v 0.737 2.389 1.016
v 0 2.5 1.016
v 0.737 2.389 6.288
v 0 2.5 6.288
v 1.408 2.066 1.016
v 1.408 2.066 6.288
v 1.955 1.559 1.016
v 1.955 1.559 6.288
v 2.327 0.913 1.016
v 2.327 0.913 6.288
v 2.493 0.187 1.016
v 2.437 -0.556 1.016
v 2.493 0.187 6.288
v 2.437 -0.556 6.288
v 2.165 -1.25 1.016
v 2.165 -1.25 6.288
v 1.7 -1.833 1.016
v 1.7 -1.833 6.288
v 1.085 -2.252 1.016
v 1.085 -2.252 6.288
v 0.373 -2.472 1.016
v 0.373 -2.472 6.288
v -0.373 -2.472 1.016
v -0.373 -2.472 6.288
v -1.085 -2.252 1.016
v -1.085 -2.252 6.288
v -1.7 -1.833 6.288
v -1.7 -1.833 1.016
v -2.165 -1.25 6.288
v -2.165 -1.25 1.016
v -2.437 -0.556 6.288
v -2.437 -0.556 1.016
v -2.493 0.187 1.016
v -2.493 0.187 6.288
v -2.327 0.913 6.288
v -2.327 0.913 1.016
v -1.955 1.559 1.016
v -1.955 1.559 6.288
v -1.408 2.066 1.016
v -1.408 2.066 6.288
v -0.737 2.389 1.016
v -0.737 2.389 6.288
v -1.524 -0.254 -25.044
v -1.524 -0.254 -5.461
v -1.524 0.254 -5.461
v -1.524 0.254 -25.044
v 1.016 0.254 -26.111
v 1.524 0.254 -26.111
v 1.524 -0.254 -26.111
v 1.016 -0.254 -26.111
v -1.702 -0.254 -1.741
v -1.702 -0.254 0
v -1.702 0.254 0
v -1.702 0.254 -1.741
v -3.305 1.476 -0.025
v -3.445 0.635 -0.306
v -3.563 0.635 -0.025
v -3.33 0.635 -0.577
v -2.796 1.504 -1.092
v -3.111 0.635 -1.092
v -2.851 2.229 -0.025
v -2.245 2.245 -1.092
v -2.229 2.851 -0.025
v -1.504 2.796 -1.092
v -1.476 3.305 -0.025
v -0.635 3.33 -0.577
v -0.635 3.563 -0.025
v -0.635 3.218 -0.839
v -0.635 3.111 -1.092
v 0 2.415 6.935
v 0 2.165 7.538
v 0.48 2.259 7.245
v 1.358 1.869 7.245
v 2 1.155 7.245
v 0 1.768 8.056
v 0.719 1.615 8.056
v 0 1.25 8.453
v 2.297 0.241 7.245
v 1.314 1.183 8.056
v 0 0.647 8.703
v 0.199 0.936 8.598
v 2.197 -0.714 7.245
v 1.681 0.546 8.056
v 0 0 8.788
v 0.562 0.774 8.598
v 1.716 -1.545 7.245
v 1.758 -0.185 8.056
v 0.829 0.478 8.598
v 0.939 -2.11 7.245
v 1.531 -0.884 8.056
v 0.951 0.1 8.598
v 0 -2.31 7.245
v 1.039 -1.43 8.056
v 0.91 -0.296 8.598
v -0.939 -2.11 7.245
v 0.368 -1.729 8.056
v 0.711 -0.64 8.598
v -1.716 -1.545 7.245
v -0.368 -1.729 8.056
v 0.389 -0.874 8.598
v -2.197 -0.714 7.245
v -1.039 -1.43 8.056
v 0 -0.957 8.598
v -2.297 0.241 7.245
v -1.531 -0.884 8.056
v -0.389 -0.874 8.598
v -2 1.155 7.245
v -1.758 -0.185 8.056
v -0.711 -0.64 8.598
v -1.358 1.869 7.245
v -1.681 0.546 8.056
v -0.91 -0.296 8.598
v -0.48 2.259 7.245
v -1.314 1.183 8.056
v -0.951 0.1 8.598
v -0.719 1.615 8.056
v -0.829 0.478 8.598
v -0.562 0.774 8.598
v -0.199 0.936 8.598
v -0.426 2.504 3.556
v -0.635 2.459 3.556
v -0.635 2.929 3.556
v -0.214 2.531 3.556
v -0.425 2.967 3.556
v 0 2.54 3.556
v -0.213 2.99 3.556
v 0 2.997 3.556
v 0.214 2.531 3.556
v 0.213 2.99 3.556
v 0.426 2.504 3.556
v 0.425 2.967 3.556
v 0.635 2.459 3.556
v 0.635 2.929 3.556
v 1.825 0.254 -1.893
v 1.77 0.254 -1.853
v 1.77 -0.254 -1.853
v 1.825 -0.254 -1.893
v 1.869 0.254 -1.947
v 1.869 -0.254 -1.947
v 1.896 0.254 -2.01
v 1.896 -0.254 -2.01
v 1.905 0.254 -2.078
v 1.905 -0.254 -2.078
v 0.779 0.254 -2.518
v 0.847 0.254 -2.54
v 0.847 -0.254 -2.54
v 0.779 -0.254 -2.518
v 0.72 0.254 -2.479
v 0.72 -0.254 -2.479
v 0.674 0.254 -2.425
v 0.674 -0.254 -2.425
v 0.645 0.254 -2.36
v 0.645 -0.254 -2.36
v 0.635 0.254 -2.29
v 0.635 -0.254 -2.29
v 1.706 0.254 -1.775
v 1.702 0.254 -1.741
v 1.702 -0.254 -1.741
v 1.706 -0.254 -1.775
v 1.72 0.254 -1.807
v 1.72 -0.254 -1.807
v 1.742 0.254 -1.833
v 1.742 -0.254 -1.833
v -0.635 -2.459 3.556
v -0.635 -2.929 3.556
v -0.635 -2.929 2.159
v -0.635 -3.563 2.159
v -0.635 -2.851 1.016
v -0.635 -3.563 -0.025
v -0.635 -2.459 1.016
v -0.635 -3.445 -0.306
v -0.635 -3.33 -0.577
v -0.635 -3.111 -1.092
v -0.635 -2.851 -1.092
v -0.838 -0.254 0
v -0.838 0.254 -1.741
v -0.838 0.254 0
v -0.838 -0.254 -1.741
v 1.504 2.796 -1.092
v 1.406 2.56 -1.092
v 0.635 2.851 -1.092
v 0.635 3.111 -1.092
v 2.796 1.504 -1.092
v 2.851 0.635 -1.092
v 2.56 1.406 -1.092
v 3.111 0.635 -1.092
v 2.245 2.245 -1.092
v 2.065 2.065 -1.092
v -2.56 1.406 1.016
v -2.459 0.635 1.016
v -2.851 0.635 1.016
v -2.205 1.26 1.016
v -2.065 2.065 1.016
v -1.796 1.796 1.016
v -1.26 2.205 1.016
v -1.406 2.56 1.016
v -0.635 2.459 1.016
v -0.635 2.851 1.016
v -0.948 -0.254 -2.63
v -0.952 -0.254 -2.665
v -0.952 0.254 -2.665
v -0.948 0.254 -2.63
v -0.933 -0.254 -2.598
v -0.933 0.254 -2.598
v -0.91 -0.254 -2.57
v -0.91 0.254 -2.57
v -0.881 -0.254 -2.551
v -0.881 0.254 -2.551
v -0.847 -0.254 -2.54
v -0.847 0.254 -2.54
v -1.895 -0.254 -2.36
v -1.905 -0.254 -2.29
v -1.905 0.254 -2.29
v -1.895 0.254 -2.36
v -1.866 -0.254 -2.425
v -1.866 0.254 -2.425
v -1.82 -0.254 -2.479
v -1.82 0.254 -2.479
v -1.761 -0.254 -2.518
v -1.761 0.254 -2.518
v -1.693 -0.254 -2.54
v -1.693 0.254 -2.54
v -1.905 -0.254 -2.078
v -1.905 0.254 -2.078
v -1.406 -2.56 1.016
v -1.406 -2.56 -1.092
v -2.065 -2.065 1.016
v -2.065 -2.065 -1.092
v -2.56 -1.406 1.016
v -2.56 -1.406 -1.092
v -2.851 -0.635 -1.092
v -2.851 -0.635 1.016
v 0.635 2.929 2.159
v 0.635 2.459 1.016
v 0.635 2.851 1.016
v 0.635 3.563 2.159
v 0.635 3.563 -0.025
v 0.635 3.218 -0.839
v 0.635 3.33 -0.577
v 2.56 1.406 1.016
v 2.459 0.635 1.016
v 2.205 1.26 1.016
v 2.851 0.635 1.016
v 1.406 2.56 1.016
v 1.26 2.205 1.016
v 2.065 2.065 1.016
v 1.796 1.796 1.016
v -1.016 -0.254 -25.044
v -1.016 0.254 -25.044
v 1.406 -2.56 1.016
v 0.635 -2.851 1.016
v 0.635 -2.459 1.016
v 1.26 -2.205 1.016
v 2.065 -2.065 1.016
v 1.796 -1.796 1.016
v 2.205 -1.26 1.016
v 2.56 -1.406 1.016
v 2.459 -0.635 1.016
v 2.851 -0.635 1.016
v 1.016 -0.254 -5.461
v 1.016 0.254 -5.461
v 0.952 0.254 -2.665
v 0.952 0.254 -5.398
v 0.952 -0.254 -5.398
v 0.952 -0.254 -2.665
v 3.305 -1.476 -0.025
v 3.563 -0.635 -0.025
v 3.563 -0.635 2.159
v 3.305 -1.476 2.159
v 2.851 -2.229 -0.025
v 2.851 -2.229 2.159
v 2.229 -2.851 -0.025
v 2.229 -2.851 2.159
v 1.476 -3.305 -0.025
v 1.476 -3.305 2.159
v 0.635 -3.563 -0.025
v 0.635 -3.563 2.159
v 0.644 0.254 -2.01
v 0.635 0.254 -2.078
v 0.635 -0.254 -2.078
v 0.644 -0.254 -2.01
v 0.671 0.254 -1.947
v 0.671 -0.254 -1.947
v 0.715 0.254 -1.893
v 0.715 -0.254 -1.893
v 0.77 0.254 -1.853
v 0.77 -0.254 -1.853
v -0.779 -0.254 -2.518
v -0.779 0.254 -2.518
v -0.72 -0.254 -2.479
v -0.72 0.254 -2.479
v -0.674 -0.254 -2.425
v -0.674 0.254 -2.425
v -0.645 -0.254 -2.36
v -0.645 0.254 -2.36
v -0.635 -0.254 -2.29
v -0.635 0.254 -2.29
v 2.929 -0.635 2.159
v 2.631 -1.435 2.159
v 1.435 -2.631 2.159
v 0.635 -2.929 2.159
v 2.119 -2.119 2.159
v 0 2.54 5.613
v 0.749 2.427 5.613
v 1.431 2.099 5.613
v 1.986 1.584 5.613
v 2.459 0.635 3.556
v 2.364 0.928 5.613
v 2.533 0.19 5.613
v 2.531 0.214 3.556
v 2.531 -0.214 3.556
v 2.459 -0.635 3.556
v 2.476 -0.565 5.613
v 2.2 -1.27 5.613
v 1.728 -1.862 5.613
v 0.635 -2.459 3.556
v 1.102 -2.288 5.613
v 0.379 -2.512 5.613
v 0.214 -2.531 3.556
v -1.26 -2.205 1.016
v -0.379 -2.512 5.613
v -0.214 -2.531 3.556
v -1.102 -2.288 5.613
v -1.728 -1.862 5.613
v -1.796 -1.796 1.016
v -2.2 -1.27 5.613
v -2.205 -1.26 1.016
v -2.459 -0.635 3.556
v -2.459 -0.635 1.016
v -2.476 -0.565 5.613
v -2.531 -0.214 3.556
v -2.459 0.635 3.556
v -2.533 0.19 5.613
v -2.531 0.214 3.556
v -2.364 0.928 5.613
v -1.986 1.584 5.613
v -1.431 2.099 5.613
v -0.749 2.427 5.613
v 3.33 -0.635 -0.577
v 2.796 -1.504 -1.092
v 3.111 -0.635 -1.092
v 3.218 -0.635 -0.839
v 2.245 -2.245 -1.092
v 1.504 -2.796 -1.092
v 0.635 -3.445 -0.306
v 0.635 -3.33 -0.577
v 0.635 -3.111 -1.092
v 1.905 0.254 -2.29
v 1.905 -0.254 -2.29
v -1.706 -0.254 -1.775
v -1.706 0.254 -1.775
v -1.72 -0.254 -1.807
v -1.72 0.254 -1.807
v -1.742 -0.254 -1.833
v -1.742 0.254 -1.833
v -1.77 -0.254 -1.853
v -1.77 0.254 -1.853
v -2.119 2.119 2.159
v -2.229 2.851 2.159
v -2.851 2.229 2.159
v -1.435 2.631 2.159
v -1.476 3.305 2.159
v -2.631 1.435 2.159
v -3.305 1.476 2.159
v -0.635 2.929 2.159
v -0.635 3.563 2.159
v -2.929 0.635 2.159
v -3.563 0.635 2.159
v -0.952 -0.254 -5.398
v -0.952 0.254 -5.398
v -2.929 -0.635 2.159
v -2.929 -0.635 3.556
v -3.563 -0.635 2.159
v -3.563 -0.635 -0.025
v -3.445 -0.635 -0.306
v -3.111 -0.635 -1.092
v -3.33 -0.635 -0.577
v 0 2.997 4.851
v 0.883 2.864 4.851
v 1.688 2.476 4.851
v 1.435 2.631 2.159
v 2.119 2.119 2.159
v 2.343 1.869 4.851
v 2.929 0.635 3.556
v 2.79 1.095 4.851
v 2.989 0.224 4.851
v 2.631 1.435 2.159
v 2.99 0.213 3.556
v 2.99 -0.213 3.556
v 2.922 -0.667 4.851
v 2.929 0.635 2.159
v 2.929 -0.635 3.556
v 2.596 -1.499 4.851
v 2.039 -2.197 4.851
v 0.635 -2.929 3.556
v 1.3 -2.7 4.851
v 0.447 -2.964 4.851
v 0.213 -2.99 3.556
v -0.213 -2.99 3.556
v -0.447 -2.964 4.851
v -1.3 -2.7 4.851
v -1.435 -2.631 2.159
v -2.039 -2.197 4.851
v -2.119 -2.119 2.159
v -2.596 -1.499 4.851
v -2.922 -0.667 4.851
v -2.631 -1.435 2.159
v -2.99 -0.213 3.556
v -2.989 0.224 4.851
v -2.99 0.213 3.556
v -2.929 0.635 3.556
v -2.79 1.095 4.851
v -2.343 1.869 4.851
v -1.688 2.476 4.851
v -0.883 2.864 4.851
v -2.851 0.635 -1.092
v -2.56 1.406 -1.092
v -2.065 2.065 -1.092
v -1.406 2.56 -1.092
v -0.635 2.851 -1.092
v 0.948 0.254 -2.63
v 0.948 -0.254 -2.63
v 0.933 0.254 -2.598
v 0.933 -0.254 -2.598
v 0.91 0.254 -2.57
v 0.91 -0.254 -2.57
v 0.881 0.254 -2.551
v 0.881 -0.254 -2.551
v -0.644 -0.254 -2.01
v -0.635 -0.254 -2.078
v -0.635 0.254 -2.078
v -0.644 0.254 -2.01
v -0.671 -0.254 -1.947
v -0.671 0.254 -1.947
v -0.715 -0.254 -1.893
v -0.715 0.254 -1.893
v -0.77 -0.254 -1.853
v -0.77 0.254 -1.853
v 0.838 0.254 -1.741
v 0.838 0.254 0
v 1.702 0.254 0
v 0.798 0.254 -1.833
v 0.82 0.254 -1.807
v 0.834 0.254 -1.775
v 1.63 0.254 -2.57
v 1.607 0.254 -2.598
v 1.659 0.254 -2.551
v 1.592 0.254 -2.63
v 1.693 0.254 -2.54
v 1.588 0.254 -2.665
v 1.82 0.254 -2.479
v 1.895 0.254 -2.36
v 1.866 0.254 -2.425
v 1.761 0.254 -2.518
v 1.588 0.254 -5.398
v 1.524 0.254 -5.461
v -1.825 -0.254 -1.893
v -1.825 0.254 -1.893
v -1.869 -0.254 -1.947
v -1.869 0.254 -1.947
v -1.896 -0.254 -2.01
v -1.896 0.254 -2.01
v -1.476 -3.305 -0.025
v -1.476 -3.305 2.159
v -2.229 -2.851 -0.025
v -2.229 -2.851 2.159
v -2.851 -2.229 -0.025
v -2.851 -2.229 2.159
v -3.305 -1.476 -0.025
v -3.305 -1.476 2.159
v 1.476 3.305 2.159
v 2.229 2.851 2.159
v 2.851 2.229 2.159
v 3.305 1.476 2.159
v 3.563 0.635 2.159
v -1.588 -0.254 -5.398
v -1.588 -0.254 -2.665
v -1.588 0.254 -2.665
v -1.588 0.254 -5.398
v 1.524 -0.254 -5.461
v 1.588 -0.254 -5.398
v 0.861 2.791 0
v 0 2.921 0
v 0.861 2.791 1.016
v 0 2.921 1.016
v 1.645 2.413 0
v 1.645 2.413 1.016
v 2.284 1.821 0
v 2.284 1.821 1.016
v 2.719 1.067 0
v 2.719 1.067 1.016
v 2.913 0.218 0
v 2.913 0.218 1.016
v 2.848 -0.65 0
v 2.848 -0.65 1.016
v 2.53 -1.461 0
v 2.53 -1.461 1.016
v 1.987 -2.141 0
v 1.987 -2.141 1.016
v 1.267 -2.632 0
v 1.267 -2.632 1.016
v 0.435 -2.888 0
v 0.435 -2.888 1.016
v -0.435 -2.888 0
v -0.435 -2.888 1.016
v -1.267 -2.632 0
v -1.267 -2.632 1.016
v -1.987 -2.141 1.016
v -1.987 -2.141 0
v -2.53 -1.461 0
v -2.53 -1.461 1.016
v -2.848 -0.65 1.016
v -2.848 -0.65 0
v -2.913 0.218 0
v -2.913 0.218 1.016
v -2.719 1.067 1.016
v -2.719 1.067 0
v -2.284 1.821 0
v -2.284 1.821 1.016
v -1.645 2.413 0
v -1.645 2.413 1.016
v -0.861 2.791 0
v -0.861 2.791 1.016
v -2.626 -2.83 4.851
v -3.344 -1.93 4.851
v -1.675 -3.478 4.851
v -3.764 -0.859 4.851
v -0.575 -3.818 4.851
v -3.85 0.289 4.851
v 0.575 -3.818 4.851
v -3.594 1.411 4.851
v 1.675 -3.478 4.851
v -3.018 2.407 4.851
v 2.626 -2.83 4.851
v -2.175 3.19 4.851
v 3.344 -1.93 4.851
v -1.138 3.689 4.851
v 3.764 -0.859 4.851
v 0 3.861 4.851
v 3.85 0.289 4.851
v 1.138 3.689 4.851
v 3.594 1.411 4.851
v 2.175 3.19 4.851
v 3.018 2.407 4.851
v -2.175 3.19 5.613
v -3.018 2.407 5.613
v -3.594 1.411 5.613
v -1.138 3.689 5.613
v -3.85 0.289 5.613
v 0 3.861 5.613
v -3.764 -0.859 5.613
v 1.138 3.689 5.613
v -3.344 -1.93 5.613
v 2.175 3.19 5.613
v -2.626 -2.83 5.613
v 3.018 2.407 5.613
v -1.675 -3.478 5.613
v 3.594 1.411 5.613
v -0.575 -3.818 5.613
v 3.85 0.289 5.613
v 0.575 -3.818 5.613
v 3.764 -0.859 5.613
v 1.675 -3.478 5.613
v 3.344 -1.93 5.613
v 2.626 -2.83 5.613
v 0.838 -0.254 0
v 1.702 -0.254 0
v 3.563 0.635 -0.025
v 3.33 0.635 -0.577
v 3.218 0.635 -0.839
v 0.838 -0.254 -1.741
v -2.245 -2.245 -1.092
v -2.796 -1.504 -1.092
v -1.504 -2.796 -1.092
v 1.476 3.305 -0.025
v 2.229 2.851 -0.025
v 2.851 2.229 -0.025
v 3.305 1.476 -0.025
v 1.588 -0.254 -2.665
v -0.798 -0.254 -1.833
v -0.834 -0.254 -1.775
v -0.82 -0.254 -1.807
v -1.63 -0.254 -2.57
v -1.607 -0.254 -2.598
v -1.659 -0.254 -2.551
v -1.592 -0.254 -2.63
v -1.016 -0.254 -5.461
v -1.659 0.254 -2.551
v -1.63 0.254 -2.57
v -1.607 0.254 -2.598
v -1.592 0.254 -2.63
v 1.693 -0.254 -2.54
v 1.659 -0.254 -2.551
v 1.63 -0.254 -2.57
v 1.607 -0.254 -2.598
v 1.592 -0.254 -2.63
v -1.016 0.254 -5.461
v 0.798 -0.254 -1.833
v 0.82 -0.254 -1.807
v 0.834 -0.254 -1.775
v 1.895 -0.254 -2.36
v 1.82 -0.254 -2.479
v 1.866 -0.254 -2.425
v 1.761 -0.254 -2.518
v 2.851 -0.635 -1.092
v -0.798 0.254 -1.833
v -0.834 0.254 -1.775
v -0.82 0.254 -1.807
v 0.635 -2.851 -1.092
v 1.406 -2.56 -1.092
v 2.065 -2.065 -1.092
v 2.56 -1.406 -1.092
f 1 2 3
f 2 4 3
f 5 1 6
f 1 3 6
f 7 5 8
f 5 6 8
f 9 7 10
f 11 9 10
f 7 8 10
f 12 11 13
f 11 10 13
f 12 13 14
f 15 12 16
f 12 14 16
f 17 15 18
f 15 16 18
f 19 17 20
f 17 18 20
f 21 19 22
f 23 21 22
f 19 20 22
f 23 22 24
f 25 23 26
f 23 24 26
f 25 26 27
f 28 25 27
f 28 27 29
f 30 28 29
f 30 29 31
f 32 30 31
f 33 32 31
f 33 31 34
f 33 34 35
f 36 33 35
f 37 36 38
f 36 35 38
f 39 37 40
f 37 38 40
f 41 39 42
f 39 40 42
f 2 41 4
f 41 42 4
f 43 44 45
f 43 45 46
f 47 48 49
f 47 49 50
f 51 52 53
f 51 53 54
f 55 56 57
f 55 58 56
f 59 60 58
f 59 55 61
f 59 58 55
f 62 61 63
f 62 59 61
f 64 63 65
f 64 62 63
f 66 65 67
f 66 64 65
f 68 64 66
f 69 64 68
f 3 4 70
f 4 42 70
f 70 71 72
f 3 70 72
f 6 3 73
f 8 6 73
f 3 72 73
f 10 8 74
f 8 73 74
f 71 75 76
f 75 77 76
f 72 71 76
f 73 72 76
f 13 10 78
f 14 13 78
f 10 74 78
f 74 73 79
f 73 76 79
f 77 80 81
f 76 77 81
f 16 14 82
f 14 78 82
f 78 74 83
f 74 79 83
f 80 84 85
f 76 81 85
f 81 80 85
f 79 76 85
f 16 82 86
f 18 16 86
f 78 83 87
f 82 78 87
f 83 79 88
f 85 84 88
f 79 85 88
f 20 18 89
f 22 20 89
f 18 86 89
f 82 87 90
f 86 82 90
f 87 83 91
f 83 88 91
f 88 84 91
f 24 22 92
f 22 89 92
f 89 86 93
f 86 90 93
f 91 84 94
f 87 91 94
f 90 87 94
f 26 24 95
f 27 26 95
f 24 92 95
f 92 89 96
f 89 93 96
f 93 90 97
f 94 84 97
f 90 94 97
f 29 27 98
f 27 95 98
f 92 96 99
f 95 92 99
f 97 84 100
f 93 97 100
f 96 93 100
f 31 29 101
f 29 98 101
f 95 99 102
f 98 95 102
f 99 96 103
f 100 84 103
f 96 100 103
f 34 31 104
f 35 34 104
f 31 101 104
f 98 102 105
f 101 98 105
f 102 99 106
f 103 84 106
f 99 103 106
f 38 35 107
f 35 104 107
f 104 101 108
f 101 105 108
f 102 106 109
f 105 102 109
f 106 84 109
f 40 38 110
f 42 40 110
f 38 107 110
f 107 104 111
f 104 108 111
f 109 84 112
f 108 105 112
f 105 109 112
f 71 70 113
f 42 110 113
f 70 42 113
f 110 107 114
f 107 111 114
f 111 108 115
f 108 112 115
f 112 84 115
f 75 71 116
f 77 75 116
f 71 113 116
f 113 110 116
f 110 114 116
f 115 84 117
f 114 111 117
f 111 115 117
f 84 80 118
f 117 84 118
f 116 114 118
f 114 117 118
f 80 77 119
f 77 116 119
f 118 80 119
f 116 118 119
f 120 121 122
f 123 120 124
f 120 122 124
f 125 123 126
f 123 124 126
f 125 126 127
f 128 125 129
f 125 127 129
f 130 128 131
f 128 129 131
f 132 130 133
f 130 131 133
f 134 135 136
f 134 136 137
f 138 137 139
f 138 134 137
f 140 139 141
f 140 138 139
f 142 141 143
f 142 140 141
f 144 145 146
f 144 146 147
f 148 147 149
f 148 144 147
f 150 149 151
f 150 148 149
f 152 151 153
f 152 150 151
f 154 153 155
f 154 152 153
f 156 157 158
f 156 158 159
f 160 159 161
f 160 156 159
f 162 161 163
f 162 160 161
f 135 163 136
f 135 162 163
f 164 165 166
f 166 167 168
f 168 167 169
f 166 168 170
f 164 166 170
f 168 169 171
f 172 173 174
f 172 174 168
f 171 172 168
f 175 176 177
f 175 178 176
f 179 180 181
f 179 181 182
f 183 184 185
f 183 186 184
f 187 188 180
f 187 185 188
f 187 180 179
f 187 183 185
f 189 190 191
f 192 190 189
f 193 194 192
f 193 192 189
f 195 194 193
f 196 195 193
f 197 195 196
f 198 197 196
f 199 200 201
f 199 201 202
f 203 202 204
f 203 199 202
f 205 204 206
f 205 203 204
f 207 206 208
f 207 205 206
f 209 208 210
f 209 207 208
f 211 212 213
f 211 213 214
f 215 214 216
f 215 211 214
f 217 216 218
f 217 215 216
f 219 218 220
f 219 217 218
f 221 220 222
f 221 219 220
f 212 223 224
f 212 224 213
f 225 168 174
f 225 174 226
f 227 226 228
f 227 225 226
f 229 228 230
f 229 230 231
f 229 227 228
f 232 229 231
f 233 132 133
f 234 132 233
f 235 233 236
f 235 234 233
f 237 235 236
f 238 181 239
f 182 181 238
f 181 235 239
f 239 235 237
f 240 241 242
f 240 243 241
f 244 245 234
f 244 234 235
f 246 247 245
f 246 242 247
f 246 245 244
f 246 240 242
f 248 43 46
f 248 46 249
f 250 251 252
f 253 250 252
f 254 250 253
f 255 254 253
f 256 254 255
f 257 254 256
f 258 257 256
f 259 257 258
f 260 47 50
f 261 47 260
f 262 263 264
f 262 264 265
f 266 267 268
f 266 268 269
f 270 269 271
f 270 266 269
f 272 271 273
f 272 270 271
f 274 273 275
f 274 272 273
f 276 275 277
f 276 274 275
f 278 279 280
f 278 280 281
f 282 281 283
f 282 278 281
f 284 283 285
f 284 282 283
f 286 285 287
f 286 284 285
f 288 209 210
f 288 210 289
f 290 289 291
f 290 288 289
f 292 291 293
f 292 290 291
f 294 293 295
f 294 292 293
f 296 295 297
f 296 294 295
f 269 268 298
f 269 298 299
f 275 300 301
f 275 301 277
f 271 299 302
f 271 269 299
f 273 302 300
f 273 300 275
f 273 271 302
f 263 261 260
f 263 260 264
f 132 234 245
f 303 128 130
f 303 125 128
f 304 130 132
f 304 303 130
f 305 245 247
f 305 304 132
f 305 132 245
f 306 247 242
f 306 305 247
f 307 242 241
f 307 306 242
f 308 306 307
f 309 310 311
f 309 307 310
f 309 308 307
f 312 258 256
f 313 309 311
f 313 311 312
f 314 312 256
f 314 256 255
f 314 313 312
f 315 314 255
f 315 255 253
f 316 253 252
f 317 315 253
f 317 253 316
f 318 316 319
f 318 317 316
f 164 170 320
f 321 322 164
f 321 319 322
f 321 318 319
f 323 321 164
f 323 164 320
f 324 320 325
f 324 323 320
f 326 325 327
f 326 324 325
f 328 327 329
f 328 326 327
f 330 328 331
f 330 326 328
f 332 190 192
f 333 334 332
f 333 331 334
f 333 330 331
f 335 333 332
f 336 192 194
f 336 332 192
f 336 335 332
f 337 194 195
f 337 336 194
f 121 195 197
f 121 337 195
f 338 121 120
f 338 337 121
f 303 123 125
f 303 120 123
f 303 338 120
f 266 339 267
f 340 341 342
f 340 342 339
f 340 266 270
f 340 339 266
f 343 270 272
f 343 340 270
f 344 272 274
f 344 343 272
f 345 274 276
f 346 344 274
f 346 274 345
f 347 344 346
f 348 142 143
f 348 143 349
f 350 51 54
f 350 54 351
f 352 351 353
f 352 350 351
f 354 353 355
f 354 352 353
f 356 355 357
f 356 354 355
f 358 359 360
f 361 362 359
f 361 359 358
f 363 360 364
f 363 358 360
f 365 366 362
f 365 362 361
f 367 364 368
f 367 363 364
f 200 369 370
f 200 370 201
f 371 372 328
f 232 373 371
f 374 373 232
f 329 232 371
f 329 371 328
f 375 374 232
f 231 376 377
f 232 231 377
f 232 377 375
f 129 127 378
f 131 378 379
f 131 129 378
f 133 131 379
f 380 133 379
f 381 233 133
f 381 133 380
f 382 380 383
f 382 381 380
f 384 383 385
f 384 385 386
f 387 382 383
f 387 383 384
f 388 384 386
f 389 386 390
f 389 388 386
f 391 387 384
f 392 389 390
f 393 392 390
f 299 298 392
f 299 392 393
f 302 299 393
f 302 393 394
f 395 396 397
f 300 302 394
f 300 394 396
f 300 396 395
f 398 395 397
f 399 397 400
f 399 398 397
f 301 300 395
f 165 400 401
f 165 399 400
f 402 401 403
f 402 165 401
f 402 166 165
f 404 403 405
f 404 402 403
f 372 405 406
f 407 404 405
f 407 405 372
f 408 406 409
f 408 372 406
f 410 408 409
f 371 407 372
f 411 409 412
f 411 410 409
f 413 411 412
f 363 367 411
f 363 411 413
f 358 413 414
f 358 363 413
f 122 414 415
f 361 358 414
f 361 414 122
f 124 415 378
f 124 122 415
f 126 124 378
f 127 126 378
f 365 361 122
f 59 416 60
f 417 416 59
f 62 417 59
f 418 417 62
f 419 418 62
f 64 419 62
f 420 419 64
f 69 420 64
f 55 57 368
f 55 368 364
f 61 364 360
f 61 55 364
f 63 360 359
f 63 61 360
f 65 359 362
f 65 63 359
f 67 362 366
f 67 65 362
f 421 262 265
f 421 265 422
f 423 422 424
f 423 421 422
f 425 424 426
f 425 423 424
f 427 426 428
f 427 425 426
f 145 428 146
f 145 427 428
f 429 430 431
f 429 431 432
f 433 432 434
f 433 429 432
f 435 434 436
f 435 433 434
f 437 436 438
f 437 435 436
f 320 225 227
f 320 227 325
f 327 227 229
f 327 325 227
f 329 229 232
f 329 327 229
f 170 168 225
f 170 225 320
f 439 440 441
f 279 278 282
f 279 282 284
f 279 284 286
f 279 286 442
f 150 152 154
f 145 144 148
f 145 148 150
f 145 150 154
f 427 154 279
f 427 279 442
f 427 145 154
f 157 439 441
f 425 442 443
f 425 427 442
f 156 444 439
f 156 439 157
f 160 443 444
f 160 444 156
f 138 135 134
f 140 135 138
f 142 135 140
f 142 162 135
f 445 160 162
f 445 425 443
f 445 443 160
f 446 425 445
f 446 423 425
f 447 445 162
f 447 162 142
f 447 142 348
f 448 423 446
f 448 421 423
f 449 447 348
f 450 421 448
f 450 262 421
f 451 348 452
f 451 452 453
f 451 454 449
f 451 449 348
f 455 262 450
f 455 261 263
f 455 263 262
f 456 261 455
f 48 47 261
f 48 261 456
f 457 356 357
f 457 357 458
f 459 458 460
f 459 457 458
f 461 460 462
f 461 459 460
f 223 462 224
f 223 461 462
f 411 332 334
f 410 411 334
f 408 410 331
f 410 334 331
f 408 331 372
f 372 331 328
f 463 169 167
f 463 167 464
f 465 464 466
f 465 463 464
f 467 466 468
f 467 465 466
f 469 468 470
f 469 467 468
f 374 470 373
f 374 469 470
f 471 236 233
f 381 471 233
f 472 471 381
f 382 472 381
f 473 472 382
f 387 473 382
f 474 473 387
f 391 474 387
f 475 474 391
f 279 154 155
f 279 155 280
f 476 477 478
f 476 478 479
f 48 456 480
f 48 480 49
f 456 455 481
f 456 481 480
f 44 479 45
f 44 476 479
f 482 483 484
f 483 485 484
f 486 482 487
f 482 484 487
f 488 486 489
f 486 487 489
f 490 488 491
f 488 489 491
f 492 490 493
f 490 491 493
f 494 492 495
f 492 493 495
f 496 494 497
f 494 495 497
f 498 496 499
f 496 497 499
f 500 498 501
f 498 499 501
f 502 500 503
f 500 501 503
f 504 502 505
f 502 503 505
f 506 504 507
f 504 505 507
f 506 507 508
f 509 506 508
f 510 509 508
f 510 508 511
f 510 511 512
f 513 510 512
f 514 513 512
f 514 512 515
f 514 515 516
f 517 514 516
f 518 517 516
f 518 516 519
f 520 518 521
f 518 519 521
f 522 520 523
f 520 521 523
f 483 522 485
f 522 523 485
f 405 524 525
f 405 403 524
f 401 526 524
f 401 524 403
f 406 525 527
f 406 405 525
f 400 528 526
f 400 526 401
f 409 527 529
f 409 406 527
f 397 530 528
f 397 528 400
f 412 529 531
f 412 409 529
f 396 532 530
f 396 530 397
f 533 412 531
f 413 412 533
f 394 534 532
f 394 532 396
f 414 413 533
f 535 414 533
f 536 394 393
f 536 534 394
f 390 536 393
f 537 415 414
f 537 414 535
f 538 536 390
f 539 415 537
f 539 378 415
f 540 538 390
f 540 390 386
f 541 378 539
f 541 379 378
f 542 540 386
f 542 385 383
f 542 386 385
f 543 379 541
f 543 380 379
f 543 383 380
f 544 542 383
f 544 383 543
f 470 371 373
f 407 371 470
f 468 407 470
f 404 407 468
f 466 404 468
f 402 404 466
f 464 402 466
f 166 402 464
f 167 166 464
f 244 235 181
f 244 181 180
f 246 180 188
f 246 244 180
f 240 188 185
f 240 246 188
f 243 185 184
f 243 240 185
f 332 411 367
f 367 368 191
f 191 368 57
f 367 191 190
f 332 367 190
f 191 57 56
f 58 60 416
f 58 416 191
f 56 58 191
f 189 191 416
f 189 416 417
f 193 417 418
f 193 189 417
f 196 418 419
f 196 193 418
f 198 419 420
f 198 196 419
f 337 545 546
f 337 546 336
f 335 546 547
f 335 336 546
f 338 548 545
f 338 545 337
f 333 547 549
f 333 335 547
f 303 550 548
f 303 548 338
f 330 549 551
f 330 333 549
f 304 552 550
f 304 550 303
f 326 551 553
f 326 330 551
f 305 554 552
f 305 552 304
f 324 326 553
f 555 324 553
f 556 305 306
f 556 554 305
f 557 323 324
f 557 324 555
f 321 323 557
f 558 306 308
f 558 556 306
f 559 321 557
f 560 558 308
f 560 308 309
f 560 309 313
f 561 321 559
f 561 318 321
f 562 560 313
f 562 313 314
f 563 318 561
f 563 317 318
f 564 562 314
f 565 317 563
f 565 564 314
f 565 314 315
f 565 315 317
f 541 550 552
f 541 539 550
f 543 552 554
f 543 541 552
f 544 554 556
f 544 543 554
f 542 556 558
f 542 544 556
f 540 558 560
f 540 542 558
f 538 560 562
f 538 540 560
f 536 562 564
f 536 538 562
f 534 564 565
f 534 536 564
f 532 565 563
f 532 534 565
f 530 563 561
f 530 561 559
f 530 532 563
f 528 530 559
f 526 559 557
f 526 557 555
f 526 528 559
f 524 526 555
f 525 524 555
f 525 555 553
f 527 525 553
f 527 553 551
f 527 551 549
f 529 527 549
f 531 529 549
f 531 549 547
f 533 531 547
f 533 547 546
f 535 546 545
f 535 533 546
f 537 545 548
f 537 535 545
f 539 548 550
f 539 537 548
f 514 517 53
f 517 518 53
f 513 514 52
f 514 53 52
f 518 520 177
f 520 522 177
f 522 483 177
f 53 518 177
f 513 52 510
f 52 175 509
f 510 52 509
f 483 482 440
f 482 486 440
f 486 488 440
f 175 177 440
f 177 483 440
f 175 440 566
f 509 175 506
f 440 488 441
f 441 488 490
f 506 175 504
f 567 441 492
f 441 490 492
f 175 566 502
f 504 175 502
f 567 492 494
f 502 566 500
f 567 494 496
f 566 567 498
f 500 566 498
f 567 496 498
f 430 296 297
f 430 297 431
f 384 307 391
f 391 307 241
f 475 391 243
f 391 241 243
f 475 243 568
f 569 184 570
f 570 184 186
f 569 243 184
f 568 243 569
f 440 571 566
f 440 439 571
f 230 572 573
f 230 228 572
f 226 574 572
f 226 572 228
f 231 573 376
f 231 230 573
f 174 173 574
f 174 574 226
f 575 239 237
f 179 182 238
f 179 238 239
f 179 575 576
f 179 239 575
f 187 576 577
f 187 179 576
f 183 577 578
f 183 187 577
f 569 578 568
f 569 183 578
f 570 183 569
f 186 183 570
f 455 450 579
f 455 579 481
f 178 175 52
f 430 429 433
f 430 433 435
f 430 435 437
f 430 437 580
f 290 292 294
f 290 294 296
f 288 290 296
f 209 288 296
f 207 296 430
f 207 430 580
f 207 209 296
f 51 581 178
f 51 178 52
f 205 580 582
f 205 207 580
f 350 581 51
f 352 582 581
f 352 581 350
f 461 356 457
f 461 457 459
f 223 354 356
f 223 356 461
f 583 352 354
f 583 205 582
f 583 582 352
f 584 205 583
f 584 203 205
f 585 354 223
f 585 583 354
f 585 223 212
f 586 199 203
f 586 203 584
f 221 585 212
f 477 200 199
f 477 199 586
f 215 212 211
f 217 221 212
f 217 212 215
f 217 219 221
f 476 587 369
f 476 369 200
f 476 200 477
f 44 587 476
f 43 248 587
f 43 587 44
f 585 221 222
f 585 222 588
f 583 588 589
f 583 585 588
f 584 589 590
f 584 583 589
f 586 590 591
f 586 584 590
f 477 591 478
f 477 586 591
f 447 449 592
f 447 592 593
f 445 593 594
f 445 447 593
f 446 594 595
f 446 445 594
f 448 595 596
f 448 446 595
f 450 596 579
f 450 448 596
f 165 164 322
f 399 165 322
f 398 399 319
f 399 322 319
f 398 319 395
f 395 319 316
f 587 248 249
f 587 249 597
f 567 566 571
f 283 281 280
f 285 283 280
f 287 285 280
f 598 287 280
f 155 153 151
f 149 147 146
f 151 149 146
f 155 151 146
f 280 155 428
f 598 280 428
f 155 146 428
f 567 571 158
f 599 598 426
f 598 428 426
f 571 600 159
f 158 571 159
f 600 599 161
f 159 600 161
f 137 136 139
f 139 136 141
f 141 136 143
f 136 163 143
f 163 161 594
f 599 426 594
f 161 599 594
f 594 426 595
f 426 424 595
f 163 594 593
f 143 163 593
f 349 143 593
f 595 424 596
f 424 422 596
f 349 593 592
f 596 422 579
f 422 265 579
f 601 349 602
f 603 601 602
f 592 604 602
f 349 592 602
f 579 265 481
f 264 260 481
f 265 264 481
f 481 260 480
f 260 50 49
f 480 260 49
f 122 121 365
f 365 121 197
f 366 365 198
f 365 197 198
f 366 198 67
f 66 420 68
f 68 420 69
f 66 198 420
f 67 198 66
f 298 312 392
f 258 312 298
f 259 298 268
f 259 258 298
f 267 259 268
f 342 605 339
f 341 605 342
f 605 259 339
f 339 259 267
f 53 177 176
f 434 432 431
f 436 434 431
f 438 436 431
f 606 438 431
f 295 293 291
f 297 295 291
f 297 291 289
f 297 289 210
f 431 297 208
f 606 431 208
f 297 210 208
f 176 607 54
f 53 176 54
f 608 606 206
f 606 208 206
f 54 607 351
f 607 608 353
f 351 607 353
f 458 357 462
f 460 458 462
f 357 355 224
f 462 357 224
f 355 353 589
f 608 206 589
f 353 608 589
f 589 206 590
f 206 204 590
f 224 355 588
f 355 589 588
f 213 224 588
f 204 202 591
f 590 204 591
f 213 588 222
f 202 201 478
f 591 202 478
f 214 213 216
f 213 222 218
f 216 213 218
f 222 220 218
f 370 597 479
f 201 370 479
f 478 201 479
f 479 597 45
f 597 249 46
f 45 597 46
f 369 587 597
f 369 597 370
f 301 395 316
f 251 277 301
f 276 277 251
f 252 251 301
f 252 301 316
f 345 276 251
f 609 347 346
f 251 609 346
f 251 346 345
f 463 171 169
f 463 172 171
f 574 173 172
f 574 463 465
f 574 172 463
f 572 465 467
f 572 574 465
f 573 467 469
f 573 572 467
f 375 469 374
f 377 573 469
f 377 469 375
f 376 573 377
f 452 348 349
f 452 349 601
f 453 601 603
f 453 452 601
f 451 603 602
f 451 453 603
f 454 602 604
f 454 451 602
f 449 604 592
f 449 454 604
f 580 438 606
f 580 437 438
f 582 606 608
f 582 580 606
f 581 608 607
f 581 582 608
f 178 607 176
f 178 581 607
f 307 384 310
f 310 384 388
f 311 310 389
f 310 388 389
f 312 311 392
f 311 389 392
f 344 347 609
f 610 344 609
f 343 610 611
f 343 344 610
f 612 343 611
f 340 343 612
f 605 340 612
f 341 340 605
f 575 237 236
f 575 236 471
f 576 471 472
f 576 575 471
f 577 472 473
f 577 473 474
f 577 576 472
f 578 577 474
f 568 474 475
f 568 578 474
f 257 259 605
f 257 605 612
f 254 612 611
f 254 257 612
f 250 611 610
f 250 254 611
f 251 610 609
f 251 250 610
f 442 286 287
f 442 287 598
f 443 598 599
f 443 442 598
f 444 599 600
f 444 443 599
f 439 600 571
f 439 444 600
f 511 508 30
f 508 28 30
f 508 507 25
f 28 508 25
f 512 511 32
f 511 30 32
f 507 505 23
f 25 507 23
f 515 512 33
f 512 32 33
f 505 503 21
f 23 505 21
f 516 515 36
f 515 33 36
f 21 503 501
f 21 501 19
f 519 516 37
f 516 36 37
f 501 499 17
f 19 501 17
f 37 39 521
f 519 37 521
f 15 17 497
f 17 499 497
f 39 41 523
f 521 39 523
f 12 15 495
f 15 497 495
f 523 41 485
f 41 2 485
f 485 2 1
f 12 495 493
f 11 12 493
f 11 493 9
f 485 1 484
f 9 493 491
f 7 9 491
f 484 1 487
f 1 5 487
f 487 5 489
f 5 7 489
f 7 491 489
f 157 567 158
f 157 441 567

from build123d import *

# Parameters (mm, degrees)
EXTRUDE1_DEPTH          = 0.254
EXTRUDE1_DEPTH_BACK     = 0.254
CUT_EXTRUDE_THIN2_START = -27.675950193
SKETCH5_W               = 1.27
SKETCH5_H               = 8.860157491
CUT_EXTRUDE_THIN2_DEPTH = 31.231950193
CIRPATTERN2_COUNT       = 2
CIRPATTERN2_ANGLE       = 90


with BuildPart() as part:
    # Sketch1 → Revolve1 (revolve)
    with BuildSketch(Plane(origin=(0, 0, 0), x_dir=(0, 0, -1), z_dir=(1, 0, 0))):
        with BuildLine():
            Line((0, 0), (0, 2.921))
            Line((0, 2.921), (-1.016, 2.921))
            Line((-1.016, 2.921), (-1.016, 2.5))
            Line((-1.016, 2.5), (-6.2884, 2.5))
            ThreePointArc((-6.2884, 2.5), (-8.056166953, 1.767766953), (-8.7884, 0))
            Line((-8.7884, 0), (0, 0))
        make_face()
    revolve(axis=Axis((0, 0, 68.7324), (0, 0, -1)))

    # Sketch3 → Extrude1 (add, two sides: drawn at the far end of the back side and taken through both)
    with BuildSketch(Plane(origin=(0, 0, 0), x_dir=(1, 0, 0), z_dir=(0, 1, 0)).offset(-EXTRUDE1_DEPTH_BACK)):
        with BuildLine():
            Line((0.8382, 0), (1.7018, 0))
            Line((1.7018, 0), (1.7018, 1.740996518))
            ThreePointArc((1.7018, 1.740996518), (1.720043698, 1.806579036), (1.769533333, 1.853319544))
            ThreePointArc((1.769533333, 1.853319544), (1.868512605, 1.946800561), (1.905, 2.077965597))
            Line((1.905, 2.077965597), (1.905, 2.289552623))
            ThreePointArc((1.905, 2.289552623), (1.844995704, 2.453508918), (1.693333333, 2.54))
            ThreePointArc((1.693333333, 2.54), (1.617502148, 2.583245541), (1.5875, 2.665223689))
            Line((1.5875, 2.665223689), (1.5875, 5.3975))
            Line((1.5875, 5.3975), (1.524, 5.461))
            Line((1.524, 5.461), (1.524, 26.1112))
            Line((1.524, 26.1112), (1.016, 26.1112))
            Line((1.016, 26.1112), (1.016, 5.461))
            Line((1.016, 5.461), (0.9525, 5.3975))
            Line((0.9525, 5.3975), (0.9525, 2.665223689))
            ThreePointArc((0.9525, 2.665223689), (0.922497852, 2.583245541), (0.846666667, 2.54))
            ThreePointArc((0.846666667, 2.54), (0.695004296, 2.453508918), (0.635, 2.289552623))
            Line((0.635, 2.289552623), (0.635, 2.077965597))
            ThreePointArc((0.635, 2.077965597), (0.671487395, 1.946800561), (0.770466667, 1.853319544))
            ThreePointArc((0.770466667, 1.853319544), (0.819956302, 1.806579036), (0.8382, 1.740996518))
            Line((0.8382, 1.740996518), (0.8382, 0))
        make_face()
        with BuildLine():
            Line((-1.5875, 5.3975), (-1.524, 5.461))
            Line((-1.524, 5.461), (-1.524, 25.0444))
            Line((-1.524, 25.0444), (-1.016, 25.0444))
            Line((-1.016, 25.0444), (-1.016, 5.461))
            Line((-1.016, 5.461), (-0.9525, 5.3975))
            Line((-0.9525, 5.3975), (-0.9525, 2.665223689))
            ThreePointArc((-0.9525, 2.665223689), (-0.922497852, 2.583245541), (-0.846666667, 2.54))
            ThreePointArc((-0.846666667, 2.54), (-0.695004296, 2.453508918), (-0.635, 2.289552623))
            Line((-0.635, 2.289552623), (-0.635, 2.077965597))
            ThreePointArc((-0.635, 2.077965597), (-0.671487395, 1.946800561), (-0.770466667, 1.853319544))
            ThreePointArc((-0.770466667, 1.853319544), (-0.819956302, 1.806579036), (-0.8382, 1.740996518))
            Line((-0.8382, 1.740996518), (-0.8382, 0))
            Line((-0.8382, 0), (-1.7018, 0))
            Line((-1.7018, 0), (-1.7018, 1.740996518))
            ThreePointArc((-1.7018, 1.740996518), (-1.720043698, 1.806579036), (-1.769533333, 1.853319544))
            ThreePointArc((-1.769533333, 1.853319544), (-1.868512605, 1.946800561), (-1.905, 2.077965597))
            Line((-1.905, 2.077965597), (-1.905, 2.289552623))
            ThreePointArc((-1.905, 2.289552623), (-1.844995704, 2.453508918), (-1.693333333, 2.54))
            ThreePointArc((-1.693333333, 2.54), (-1.617502148, 2.583245541), (-1.5875, 2.665223689))
            Line((-1.5875, 2.665223689), (-1.5875, 5.3975))
        make_face()
    extrude(amount=EXTRUDE1_DEPTH + EXTRUDE1_DEPTH_BACK)


with BuildPart() as body_2:
    # Sketch4 → Revolve3 (revolve)
    with BuildSketch(Plane(origin=(0, 0, 0), x_dir=(0, 0, -1), z_dir=(1, 0, 0))):
        Polygon((-5.6134, 3.8608), (-5.6134, 2.54), (-1.016, 2.54), (-1.016, 2.921), (1.0922, 2.921), (1.0922, 3.175), (0.0254, 3.6195), (-2.159, 3.6195), (-2.159, 2.9972), (-4.8514, 2.9972), (-4.8514, 3.8608), align=None)
    revolve(axis=Axis((0, 0, 10.223161333), (0, 0, -1)))

    # Sketch5 → Cut-Extrude-Thin2 (cut)
    with BuildSketch(Plane.XY.offset(CUT_EXTRUDE_THIN2_START)):
        with Locations((0, -0.066617726)):
            Rectangle(SKETCH5_W, SKETCH5_H)
    cut_extrude_thin2 = extrude(amount=CUT_EXTRUDE_THIN2_DEPTH, mode=Mode.SUBTRACT)

    # CirPattern2: Cut-Extrude-Thin2 ×2 about axis
    cirpattern2_axis = Axis((0, 0, 68.7324), (0, 0, -1))
    for i in range(1, CIRPATTERN2_COUNT):
        add(cut_extrude_thin2.rotate(cirpattern2_axis, i * CIRPATTERN2_ANGLE / (CIRPATTERN2_COUNT - 1)), mode=Mode.SUBTRACT)


solid = Compound([part.part, body_2.part])
